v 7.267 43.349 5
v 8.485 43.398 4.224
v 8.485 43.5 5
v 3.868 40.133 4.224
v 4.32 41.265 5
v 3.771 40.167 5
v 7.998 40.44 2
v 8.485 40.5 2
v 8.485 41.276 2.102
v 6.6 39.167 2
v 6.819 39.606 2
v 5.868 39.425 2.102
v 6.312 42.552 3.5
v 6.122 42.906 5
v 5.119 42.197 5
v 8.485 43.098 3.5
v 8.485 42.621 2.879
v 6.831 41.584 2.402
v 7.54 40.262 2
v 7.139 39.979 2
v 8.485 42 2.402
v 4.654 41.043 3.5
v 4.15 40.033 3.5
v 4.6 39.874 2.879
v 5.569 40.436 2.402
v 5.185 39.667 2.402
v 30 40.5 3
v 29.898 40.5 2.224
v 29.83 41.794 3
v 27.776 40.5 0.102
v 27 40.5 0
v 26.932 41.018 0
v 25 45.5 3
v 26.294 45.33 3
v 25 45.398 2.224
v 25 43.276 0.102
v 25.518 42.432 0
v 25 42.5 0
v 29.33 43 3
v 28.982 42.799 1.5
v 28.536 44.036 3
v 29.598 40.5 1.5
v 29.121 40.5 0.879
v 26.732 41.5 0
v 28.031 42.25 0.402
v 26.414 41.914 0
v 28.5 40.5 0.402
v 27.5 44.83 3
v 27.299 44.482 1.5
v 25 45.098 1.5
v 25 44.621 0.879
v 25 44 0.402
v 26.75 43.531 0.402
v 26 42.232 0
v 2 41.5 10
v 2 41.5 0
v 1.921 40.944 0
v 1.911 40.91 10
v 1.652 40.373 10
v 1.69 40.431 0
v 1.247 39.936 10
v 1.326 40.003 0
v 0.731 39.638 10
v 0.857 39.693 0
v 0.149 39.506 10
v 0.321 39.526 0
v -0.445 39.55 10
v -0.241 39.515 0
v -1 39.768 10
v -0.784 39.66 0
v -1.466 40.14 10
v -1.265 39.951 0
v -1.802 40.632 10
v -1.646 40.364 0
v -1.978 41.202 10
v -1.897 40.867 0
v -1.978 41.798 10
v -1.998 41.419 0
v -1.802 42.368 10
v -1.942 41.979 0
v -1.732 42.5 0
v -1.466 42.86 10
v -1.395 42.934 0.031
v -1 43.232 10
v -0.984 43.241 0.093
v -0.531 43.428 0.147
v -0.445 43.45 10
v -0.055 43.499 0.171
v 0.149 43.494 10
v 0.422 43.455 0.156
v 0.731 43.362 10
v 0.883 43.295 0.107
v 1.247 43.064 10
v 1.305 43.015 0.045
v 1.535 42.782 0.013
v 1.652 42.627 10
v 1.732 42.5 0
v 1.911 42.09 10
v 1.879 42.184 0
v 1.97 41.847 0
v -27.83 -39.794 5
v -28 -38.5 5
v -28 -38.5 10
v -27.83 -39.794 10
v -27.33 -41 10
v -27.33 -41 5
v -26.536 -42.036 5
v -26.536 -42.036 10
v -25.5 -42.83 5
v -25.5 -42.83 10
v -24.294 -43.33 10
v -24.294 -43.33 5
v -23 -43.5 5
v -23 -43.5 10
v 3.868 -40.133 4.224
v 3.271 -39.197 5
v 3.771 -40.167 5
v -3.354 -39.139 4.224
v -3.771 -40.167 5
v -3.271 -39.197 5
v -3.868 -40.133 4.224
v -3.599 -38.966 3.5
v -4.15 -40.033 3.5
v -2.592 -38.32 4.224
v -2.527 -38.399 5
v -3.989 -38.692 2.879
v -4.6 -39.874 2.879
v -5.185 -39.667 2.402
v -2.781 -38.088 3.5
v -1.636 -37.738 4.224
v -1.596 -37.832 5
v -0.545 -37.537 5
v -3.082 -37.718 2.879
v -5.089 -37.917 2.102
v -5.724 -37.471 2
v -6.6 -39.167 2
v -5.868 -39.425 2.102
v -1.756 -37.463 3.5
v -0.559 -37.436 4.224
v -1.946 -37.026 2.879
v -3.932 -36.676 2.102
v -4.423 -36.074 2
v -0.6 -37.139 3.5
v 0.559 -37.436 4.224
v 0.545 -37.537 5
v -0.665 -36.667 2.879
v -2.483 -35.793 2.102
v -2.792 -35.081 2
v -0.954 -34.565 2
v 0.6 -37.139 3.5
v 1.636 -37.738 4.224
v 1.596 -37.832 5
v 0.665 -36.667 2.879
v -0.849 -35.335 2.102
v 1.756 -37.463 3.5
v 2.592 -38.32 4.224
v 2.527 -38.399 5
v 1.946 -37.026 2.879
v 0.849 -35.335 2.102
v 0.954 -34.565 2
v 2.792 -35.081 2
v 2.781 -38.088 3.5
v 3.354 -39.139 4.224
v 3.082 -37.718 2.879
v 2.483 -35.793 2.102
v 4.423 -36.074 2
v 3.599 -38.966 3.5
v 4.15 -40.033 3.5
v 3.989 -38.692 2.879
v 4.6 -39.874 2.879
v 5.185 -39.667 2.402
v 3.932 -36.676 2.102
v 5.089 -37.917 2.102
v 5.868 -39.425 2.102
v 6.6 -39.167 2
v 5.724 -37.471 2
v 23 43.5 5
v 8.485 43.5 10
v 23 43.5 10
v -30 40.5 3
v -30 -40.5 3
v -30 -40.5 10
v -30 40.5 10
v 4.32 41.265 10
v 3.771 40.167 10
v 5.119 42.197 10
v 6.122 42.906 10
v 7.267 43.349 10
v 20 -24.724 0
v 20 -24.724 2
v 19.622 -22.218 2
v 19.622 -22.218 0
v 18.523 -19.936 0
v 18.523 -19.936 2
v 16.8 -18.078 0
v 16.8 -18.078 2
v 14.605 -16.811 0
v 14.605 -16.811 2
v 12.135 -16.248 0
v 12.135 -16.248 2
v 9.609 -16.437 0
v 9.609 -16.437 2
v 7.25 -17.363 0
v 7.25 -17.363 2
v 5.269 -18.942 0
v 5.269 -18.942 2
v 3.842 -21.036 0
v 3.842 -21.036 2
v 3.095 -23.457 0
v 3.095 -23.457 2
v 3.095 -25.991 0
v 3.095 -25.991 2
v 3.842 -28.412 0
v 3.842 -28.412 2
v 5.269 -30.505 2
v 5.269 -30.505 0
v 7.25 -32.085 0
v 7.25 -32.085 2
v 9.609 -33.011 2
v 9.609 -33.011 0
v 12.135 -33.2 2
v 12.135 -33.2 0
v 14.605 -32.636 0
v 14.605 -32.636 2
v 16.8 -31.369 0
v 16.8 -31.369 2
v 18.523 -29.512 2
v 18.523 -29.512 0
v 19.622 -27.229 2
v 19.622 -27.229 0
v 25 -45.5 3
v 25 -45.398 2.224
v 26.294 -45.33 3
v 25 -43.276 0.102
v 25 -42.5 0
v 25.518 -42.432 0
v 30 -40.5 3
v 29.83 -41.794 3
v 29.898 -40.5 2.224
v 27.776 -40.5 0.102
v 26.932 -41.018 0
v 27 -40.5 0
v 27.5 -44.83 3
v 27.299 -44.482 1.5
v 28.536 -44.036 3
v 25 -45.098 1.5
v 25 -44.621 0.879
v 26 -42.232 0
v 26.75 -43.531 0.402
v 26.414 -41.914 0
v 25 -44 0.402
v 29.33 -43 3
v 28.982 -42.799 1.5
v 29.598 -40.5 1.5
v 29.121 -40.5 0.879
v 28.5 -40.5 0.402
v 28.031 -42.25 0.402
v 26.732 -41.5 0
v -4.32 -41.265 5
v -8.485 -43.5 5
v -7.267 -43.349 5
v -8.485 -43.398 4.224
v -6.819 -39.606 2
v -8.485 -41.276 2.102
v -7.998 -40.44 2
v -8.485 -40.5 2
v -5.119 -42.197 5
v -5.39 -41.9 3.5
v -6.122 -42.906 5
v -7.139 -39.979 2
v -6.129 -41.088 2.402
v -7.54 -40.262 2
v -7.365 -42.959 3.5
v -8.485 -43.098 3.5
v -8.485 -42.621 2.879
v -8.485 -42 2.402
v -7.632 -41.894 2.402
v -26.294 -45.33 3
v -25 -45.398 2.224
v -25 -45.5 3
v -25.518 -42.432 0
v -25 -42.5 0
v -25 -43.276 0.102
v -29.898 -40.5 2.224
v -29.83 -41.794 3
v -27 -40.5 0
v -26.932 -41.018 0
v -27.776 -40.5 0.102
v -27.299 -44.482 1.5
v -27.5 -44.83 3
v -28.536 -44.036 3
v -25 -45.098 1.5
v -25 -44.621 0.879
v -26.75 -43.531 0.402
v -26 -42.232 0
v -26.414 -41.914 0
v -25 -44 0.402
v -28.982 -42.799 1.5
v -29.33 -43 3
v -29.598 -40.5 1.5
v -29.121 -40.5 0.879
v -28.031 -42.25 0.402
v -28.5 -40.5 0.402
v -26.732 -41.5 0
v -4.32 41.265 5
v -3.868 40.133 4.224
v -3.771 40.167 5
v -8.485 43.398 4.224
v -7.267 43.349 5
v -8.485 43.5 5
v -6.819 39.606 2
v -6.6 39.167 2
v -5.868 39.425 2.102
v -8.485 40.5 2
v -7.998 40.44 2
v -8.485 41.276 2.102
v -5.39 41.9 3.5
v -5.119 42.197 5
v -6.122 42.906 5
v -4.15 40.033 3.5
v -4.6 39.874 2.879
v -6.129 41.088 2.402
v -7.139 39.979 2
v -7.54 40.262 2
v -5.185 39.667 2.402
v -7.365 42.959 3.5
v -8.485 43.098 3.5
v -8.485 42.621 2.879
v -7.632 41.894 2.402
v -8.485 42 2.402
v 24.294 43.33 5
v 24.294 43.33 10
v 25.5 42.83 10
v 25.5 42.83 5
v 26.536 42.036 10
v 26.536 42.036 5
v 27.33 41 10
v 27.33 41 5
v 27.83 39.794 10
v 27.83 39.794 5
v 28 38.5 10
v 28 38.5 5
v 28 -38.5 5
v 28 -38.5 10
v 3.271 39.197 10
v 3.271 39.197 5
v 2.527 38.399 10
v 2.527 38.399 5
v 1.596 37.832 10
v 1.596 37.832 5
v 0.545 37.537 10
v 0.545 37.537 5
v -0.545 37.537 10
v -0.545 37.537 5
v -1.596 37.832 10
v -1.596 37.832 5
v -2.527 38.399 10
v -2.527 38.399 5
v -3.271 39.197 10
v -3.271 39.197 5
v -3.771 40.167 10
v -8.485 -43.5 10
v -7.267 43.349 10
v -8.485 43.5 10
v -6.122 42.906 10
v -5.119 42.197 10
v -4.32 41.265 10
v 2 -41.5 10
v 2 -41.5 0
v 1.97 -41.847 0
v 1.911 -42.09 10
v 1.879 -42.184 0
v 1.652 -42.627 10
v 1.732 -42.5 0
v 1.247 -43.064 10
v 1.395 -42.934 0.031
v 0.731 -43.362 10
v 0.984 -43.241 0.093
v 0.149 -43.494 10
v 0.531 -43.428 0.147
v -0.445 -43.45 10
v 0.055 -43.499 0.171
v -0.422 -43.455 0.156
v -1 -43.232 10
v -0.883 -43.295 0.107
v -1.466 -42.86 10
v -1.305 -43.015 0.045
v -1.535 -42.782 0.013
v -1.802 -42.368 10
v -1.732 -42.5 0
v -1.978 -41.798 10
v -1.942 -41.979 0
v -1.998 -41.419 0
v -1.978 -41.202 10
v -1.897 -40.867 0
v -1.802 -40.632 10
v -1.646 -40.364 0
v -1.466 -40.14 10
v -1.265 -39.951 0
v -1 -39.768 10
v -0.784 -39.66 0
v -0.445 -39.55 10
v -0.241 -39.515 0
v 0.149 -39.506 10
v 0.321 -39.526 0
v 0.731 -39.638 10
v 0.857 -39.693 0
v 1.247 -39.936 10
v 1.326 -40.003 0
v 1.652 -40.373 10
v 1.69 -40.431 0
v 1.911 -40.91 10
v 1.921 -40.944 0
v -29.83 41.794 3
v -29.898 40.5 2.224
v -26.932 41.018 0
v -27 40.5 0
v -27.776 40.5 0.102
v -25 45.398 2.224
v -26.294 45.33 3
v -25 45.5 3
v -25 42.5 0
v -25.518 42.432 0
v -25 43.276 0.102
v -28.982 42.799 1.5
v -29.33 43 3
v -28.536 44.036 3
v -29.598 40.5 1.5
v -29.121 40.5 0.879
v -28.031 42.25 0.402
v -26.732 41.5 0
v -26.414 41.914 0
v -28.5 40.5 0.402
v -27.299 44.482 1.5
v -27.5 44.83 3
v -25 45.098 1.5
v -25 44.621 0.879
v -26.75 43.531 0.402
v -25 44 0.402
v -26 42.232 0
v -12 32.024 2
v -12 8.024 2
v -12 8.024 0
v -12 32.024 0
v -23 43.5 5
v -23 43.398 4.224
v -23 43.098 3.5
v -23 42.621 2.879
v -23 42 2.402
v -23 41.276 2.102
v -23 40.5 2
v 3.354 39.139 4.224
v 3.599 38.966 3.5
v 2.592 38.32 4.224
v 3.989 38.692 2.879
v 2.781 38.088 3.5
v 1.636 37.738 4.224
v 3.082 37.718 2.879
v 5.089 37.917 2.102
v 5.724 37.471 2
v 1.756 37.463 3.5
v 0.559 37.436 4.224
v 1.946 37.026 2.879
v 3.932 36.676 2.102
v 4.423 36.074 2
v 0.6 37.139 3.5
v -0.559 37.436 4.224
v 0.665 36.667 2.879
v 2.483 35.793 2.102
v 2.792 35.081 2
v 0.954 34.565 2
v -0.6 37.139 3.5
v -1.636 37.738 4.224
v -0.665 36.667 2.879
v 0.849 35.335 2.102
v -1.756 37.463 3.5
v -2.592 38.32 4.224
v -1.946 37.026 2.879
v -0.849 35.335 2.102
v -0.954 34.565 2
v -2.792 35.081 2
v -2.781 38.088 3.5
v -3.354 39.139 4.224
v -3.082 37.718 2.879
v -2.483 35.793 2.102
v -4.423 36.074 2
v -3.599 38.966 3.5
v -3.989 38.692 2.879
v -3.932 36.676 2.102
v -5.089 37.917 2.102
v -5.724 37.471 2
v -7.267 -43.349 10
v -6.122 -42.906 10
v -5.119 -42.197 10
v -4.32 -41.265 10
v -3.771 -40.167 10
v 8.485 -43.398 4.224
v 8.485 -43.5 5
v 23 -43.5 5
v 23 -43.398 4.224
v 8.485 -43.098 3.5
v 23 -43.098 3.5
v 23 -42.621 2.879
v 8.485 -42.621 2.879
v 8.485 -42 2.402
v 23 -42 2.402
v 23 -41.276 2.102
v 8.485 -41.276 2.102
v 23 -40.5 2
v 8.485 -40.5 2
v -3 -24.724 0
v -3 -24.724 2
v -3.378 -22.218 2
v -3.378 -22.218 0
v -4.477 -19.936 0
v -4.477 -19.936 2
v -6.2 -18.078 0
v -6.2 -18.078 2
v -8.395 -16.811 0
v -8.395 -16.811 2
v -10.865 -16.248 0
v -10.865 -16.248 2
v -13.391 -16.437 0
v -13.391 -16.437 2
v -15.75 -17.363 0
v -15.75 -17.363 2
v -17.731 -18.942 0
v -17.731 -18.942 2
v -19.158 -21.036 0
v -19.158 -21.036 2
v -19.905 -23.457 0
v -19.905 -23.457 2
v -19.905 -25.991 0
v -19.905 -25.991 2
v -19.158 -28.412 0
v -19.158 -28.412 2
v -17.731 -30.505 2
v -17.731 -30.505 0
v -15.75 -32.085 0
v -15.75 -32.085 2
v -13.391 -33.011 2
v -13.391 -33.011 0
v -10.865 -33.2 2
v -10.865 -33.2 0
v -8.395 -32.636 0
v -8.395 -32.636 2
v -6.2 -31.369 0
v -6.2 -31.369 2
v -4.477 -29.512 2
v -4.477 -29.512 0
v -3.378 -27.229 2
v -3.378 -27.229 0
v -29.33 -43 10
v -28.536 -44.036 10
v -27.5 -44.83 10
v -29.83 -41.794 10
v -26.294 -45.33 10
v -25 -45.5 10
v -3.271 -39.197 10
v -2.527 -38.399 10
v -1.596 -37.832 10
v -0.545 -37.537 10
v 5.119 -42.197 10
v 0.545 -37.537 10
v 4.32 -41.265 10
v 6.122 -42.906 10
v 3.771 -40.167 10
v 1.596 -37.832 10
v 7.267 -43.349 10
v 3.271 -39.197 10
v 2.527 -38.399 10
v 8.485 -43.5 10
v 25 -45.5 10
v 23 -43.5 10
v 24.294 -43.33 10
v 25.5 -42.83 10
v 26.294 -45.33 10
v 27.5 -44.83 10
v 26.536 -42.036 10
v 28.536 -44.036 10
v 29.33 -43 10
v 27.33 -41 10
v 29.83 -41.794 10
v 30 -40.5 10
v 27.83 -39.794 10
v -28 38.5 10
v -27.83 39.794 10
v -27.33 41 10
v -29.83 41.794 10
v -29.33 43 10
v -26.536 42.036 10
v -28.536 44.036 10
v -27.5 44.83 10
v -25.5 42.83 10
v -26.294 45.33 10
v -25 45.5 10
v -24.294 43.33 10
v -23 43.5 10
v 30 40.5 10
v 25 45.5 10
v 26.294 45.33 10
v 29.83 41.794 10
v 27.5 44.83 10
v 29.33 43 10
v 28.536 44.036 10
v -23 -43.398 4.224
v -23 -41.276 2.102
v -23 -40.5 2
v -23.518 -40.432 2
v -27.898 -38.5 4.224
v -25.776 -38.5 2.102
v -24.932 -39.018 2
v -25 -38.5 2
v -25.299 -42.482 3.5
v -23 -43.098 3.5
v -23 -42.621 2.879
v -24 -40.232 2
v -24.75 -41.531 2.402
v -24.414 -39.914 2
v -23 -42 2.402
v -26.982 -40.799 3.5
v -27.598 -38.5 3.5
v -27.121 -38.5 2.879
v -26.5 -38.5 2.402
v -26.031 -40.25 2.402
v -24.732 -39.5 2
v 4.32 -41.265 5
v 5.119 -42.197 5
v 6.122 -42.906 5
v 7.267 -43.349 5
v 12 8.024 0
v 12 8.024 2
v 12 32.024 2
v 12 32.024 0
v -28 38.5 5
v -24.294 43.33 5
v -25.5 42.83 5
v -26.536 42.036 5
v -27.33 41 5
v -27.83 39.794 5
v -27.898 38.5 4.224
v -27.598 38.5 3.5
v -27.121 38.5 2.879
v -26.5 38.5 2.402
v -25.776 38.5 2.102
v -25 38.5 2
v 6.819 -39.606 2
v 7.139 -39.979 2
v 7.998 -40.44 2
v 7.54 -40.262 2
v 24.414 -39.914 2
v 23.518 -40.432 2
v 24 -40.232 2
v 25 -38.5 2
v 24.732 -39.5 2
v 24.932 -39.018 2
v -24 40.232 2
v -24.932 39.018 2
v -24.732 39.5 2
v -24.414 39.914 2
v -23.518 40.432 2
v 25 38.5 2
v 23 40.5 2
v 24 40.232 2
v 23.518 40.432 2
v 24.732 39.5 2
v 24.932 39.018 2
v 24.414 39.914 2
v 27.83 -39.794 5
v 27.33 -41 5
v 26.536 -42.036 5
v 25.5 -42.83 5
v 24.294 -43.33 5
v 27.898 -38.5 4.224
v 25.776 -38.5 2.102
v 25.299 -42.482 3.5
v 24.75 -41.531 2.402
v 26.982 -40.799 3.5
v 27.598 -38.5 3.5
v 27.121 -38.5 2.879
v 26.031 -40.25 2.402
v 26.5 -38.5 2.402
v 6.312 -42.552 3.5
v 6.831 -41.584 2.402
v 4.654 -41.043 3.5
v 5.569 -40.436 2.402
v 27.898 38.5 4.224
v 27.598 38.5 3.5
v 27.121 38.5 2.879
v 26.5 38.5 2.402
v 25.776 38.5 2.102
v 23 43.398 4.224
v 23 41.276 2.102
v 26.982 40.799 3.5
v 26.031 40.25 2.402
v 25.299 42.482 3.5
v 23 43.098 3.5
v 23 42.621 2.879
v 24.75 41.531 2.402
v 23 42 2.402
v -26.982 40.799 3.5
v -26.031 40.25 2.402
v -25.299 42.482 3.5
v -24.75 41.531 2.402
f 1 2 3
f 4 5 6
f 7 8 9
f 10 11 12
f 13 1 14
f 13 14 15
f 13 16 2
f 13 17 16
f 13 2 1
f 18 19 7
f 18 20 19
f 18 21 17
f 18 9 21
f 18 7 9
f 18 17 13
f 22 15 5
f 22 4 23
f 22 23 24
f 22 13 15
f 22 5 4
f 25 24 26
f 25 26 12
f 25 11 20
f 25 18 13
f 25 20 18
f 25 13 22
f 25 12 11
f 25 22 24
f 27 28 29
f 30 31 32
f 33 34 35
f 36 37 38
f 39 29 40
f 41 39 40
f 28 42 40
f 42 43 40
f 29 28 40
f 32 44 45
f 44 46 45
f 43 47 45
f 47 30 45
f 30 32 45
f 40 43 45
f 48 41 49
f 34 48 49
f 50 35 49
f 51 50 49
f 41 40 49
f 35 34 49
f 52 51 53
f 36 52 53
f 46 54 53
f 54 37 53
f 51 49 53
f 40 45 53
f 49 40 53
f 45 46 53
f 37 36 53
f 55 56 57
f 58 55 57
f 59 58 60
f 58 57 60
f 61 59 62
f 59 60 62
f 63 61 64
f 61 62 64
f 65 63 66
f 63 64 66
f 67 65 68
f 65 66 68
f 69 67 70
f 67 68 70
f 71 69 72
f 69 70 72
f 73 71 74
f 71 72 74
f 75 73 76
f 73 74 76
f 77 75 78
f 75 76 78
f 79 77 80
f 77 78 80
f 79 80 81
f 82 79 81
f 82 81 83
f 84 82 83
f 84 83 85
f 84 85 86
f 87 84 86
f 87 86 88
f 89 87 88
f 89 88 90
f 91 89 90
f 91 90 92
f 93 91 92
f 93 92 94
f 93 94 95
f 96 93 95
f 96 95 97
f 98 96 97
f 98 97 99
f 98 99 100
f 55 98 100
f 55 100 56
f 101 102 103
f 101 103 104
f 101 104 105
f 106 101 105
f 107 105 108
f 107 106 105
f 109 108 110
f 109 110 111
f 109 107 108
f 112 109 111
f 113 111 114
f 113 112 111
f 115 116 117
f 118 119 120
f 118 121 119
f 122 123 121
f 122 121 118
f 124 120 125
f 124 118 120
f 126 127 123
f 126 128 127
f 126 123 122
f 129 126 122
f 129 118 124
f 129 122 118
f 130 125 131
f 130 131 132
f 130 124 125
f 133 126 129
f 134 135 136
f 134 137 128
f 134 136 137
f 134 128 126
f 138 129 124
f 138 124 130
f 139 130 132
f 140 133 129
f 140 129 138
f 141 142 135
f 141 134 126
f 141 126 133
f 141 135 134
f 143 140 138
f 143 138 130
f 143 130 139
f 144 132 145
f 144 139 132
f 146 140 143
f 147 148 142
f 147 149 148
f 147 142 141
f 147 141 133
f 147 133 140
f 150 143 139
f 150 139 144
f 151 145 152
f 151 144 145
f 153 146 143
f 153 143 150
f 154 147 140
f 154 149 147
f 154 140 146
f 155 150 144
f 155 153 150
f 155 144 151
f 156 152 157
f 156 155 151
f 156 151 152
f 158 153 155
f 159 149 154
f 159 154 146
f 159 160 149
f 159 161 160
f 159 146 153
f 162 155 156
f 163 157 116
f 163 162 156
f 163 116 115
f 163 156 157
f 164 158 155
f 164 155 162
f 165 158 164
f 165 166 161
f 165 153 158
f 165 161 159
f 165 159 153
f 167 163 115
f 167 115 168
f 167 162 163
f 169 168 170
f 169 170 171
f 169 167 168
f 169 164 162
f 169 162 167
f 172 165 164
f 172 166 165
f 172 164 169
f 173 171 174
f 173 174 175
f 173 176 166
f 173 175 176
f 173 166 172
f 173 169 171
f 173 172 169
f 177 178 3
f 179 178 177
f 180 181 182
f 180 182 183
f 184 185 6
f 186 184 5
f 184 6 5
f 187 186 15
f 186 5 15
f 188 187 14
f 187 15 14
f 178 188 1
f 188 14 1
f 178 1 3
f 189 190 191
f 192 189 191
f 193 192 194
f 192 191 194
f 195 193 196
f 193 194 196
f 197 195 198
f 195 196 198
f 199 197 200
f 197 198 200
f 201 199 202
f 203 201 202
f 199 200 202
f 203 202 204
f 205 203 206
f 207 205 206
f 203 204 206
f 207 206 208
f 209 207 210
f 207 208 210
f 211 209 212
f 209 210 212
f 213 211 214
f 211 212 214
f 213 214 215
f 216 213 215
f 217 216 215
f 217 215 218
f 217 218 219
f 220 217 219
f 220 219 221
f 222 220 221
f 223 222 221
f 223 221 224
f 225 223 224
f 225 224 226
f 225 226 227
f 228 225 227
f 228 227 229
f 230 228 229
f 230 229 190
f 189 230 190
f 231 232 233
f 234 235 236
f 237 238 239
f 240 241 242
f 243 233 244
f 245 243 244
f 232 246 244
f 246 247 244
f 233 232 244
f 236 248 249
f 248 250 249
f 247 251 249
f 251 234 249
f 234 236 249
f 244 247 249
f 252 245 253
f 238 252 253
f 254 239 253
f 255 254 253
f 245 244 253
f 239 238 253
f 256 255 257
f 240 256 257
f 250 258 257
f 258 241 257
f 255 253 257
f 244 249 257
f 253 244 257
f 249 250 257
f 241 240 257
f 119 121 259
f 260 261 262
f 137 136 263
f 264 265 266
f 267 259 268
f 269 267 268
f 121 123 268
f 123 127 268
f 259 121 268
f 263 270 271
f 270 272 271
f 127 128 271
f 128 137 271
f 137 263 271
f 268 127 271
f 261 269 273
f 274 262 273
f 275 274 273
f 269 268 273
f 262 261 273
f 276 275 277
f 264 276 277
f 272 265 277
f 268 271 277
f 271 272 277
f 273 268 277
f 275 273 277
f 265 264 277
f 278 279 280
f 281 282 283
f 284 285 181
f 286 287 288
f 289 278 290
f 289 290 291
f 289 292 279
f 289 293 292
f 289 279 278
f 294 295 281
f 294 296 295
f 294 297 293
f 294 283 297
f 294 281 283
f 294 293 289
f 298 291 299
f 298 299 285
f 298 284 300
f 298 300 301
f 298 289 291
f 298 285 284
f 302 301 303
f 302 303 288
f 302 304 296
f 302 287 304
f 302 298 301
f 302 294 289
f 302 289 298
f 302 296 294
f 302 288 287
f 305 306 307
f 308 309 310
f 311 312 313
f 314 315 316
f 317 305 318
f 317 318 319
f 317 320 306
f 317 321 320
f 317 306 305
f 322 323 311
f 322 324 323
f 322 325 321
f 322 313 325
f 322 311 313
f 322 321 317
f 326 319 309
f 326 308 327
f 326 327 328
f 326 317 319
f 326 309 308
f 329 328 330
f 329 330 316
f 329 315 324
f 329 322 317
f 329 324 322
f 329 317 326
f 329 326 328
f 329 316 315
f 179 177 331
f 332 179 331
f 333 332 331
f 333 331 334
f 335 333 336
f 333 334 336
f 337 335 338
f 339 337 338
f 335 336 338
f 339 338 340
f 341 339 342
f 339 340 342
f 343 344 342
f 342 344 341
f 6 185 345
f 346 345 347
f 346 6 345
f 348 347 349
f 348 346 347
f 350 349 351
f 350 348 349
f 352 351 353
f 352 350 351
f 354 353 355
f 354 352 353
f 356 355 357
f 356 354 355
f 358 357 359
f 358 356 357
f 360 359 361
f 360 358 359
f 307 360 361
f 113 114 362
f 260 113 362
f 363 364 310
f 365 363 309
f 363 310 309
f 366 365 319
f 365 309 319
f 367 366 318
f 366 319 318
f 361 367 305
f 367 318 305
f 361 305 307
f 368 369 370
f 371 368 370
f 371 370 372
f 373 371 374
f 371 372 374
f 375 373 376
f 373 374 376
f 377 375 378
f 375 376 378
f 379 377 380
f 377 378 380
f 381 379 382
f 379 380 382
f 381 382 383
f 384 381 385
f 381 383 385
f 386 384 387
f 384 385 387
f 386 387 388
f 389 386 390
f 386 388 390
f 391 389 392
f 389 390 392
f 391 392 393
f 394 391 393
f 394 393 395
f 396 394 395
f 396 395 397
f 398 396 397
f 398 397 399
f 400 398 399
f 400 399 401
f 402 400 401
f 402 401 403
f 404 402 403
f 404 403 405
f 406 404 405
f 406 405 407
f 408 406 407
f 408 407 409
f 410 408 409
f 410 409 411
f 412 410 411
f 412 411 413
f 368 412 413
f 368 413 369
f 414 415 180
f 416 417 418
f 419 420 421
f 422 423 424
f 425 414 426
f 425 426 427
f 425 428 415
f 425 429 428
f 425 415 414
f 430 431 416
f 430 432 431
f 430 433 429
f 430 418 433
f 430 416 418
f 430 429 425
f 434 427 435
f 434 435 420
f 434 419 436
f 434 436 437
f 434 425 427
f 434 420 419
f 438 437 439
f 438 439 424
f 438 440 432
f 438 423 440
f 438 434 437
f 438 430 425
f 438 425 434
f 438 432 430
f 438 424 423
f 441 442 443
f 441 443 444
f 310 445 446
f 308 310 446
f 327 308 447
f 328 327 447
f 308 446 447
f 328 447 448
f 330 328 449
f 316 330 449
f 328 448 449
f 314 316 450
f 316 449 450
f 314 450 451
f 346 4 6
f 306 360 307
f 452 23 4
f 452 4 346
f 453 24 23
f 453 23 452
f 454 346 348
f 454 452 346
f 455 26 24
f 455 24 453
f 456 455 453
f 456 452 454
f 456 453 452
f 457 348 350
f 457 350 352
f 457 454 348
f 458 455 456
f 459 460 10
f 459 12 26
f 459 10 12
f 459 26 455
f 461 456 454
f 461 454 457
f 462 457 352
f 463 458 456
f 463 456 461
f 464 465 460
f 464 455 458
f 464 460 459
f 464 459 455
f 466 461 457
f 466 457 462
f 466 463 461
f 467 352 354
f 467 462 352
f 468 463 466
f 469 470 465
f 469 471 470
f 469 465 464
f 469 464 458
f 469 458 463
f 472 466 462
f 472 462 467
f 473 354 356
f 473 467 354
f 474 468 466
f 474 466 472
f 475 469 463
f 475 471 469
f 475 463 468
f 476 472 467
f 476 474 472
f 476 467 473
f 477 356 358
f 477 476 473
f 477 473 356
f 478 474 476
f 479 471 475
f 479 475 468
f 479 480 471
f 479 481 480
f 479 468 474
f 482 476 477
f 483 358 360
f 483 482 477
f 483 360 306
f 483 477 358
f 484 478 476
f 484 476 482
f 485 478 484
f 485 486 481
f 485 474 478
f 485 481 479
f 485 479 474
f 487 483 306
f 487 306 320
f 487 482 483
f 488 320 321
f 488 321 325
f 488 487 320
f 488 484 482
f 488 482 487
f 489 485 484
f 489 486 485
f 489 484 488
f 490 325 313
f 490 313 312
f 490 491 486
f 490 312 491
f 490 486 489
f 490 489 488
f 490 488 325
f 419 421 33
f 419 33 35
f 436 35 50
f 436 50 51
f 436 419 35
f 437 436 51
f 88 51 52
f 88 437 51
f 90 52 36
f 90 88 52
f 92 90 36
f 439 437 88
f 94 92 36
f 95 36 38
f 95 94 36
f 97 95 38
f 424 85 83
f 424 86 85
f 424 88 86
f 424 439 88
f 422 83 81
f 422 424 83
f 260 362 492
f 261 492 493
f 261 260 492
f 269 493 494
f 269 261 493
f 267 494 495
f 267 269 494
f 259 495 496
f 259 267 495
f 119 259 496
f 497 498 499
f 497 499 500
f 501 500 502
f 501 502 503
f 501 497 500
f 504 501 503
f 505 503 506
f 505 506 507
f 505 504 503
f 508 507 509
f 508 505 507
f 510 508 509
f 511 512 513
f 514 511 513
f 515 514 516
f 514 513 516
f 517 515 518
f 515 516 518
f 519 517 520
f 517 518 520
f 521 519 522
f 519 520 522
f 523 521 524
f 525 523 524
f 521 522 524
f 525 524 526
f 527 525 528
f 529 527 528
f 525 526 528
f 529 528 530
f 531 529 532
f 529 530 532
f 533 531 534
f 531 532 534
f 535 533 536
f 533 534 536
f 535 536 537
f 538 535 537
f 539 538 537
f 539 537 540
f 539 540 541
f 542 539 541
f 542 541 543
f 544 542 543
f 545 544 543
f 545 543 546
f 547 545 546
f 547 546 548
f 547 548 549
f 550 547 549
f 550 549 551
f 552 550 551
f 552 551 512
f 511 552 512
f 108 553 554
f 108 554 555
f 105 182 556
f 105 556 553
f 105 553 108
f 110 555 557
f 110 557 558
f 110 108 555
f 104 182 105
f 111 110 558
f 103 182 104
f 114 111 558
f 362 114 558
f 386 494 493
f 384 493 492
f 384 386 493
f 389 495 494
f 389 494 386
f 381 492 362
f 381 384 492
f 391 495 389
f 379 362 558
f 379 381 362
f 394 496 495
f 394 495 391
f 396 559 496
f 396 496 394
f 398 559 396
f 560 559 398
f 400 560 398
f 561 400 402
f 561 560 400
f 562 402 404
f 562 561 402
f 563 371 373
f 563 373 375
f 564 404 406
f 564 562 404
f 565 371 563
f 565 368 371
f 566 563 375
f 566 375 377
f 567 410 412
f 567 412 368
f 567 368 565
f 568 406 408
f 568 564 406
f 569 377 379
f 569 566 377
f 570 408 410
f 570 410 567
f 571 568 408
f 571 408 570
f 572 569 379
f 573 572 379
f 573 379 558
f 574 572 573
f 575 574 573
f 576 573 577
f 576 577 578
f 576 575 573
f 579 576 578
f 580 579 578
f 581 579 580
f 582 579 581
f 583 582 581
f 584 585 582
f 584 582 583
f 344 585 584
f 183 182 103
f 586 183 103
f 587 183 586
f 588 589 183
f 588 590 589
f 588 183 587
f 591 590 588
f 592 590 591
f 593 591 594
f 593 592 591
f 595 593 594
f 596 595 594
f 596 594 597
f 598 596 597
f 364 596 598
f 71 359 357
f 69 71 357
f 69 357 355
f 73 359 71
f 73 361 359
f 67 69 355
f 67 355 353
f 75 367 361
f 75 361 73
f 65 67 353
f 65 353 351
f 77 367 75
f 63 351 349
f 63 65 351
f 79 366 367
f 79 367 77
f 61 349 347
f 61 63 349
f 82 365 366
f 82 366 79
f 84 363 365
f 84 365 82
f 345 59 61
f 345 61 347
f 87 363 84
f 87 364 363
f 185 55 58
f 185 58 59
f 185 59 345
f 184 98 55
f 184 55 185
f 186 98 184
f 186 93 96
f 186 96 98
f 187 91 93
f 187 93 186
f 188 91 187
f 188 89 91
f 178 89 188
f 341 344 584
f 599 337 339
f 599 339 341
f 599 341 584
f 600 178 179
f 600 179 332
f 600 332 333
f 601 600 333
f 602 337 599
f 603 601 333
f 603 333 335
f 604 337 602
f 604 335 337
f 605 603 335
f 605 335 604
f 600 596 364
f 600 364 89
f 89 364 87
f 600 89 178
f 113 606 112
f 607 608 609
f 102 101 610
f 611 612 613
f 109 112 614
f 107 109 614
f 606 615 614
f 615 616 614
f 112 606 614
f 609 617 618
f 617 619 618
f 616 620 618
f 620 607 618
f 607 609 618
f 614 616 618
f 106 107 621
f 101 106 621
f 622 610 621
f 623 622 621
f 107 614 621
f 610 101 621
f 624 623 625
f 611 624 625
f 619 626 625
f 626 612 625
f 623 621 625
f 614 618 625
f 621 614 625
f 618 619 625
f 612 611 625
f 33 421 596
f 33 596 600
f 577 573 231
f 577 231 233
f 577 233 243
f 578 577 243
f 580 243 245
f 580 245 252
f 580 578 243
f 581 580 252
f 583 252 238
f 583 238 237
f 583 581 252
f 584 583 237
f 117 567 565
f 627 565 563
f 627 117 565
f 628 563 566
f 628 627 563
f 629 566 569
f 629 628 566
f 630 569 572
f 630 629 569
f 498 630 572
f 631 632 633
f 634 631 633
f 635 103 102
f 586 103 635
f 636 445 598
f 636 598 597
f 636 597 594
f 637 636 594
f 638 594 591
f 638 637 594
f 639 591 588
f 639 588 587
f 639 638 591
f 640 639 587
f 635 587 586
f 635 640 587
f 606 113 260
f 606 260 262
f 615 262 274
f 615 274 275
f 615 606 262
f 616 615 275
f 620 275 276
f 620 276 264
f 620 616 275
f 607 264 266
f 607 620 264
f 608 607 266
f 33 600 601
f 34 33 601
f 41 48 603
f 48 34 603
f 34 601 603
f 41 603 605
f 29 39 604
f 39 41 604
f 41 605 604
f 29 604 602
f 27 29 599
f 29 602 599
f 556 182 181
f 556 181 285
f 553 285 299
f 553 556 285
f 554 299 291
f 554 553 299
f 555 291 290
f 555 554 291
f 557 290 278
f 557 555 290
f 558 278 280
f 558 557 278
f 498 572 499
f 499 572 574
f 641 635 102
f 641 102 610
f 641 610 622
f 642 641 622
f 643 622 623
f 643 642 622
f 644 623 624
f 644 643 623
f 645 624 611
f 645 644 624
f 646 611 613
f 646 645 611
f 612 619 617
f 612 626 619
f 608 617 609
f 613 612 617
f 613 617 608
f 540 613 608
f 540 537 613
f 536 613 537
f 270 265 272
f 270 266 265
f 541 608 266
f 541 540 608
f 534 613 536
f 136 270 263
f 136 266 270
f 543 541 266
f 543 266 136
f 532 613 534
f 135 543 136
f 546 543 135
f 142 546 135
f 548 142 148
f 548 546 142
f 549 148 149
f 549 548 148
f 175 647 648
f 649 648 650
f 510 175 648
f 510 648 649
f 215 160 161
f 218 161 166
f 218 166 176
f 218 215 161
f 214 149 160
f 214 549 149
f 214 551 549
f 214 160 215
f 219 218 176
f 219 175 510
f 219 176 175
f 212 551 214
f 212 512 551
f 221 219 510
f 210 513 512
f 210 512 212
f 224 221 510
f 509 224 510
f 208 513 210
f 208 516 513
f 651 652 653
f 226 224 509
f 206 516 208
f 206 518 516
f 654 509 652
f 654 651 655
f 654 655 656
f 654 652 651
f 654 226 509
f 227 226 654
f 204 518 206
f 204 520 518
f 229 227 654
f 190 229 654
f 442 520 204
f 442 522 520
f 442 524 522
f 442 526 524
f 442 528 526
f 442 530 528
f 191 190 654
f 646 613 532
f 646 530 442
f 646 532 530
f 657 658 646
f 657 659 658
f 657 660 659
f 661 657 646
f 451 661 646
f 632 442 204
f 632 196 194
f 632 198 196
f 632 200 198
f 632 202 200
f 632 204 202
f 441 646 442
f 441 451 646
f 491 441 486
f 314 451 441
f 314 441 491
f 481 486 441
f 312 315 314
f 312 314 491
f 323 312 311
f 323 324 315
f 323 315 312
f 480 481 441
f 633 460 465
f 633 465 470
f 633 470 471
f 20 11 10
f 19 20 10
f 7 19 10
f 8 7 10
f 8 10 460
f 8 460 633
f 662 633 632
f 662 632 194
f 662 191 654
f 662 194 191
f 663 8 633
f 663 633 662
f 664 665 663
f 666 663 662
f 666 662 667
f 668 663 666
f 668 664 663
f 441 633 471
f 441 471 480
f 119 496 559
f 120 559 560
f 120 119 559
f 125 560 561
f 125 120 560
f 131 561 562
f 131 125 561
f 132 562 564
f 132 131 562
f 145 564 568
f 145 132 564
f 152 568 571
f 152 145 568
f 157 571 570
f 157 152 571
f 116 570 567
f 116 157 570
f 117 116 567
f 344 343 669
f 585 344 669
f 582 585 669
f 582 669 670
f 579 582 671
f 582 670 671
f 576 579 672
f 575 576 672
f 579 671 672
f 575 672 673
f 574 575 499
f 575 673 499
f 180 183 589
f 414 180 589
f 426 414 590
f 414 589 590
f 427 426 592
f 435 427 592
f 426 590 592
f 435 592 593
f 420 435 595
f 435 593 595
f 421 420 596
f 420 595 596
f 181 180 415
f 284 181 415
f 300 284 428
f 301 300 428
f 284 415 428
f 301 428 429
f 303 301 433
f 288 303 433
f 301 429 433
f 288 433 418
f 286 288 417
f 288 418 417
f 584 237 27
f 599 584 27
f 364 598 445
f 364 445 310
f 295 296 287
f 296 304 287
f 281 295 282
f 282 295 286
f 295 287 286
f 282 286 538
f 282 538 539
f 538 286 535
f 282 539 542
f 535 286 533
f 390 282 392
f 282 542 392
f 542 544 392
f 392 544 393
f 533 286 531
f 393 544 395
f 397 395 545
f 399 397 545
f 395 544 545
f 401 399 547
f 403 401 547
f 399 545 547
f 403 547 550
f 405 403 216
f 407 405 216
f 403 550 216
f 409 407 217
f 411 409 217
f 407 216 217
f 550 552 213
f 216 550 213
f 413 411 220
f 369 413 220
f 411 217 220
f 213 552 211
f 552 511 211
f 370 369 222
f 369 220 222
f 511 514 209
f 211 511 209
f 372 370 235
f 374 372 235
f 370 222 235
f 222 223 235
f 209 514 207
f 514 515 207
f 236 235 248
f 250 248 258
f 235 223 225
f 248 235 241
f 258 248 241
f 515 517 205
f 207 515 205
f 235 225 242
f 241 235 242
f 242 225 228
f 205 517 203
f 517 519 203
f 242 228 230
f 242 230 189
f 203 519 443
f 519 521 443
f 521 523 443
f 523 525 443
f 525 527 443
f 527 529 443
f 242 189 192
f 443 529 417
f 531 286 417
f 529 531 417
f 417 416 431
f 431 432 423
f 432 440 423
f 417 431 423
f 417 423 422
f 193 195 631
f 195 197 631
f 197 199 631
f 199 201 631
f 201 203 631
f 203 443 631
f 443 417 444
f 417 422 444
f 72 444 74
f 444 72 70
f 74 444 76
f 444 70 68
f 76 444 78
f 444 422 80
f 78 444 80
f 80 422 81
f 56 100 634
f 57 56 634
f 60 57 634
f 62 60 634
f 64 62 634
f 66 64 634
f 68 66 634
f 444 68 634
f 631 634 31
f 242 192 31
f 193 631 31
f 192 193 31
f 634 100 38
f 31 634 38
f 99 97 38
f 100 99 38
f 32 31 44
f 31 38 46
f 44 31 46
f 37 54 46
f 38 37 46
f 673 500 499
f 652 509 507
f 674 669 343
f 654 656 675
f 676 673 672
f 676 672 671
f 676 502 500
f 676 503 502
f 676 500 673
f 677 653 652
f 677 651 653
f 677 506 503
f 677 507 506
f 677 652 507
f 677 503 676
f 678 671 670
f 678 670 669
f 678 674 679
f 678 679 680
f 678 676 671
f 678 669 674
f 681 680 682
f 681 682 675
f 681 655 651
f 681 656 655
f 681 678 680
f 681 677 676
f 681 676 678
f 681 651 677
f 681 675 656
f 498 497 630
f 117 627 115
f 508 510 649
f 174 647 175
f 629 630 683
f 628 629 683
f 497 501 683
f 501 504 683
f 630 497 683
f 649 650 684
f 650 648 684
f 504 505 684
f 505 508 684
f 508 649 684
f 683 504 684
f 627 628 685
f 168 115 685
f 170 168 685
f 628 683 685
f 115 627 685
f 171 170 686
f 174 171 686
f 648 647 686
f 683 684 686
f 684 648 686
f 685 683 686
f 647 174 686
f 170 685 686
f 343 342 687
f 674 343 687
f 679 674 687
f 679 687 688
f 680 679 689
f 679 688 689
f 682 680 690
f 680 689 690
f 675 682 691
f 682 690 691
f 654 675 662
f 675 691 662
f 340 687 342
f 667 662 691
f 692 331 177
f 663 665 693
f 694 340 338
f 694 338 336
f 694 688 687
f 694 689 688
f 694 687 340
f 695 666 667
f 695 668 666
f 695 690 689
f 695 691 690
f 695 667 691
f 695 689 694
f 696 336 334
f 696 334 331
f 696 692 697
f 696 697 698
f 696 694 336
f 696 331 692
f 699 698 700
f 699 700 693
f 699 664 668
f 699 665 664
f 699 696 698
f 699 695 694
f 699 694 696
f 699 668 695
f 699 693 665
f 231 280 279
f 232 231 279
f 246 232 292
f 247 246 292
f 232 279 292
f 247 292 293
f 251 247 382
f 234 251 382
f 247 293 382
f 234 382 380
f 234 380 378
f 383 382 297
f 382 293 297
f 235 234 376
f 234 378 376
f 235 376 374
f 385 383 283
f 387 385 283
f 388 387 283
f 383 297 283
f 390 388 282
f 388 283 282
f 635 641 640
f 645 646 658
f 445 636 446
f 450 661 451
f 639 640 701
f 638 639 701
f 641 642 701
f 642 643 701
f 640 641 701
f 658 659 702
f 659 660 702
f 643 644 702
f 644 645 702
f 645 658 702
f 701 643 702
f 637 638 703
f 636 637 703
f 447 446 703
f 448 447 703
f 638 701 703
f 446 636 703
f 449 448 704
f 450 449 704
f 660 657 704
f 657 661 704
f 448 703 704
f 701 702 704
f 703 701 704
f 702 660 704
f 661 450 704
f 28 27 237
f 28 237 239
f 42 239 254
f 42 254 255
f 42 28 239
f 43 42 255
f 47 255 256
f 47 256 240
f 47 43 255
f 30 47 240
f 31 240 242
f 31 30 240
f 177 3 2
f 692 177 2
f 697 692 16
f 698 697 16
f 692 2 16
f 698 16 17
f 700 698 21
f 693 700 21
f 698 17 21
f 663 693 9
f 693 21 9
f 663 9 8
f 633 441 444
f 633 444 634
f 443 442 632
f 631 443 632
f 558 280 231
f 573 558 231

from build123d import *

# Parameters (mm, degrees)
F3_W          = 60
F3_H          = 91
F4_DEPTH      = 10
F5_W          = 56
F5_H          = 87
F5_W_2        = 24
F5_H_2        = 24
F6_DEPTH      = 8
F7_R          = 4
F8_DEPTH      = 10
F9_R          = 2
F10_DEPTH     = 10.001
F11_R         = 5
F12_R         = 5
F13_T1_DEPTH  = 77
F13_T3_DEPTH  = 14.5147186258
F13_T5_DEPTH  = 14.5147186258
F13_T8_ANGLE  = 90
F13_T10_ANGLE = 70.5287793655
F13_T12_ANGLE = 141.057558731
F13_T14_ANGLE = 90
F13_T16_ANGLE = 70.5287793655
F13_T18_ANGLE = 70.5287793655
F13_T20_ANGLE = 90
F13_T22_ANGLE = 141.057558731
F13_T24_ANGLE = 70.5287793655
F13_T26_ANGLE = 90
F13_T27_DEPTH = 81
F13_T29_DEPTH = 50
F13_T32_ANGLE = 90
F13_T34_ANGLE = 90
F13_T36_ANGLE = 90
F13_T38_ANGLE = 90
F14_R         = 8.5
F15_DEPTH     = 2.0010001
F16_DEPTH     = 10.0010001


# Not quite as in the source:
# - a fillet or chamfer that OpenCascade refuses, or shapes differently, is made with other operations: its cross-section is extruded or revolved along the edge and cut away or added


with BuildPart() as f4:
    # F3 (on Top) → F4 (new body)
    with BuildSketch(Plane.XY):
        Rectangle(F3_W, F3_H)
    extrude(amount=F4_DEPTH)

    # F5 (on face) → F6 (cut)
    with BuildSketch(Plane.XY.offset(10)):
        Rectangle(F5_W, F5_H)
        with Locations((0, 20.0242325664)):
            Rectangle(F5_W_2, F5_H_2, mode=Mode.SUBTRACT)
    extrude(amount=-F6_DEPTH, mode=Mode.SUBTRACT)

    # F7 (on face) → F8 (join)
    with BuildSketch(Plane(origin=(0, 0, 0), x_dir=(1, 0, 0), z_dir=(0, 0, -1))):
        with Locations((0, -41.5)):
            Circle(F7_R)
        with Locations((0, 41.5)):
            Circle(F7_R)
    extrude(amount=-F8_DEPTH)

    # F9 (on face) → F10 (cut, through all)
    with BuildSketch(Plane(origin=(0, 0, 0), x_dir=(1, 0, 0), z_dir=(0, 0, -1))):
        with Locations((0, -41.5)):
            Circle(F9_R)
        with Locations((0, 41.5)):
            Circle(F9_R)
    extrude(amount=-F10_DEPTH, mode=Mode.SUBTRACT)

    # F11
    f11_edges = [f4.edges().sort_by_distance(p)[0] for p in [
        (3.464102, 43.5, 6),
        (-3.464102, 43.5, 6),
        (-3.464102, -43.5, 6),
        (3.464102, -43.5, 6),
    ]]
    fillet(f11_edges, radius=F11_R)

    # F12
    f12_edges = [f4.edges().sort_by_distance(p)[0] for p in [
        (30, -45.5, 5),
        (-30, -45.5, 5),
        (30, 45.5, 5),
        (-30, 45.5, 5),
        (28, -43.5, 6),
        (-28, -43.5, 6),
        (-28, 43.5, 6),
        (28, 43.5, 6),
    ]]
    fillet(f12_edges, radius=F12_R)

    # F13: fillet of radius 3 on 24 edges, made by hand

    # F13_s2 → F13_t1 (join)
    with BuildSketch(Plane.XZ.offset(-38.5)):
        with BuildLine():
            ThreePointArc((-28, 5), (-27.1213203436, 2.8786796564), (-25, 2))
            Line((-25, 2), (-28, 2))
            Line((-28, 2), (-28, 5))
        make_face()
        with BuildLine():
            ThreePointArc((28, 5), (27.1213203436, 2.8786796564), (25, 2))
            Line((25, 2), (28, 2))
            Line((28, 2), (28, 5))
        make_face()
    extrude(amount=F13_T1_DEPTH)

    # F13_s4 → F13_t3 (join)
    with BuildSketch(Plane.YZ.offset(8.4852813742)):
        with BuildLine():
            ThreePointArc((-43.5, 5), (-42.6213203436, 2.8786796564), (-40.5, 2))
            Line((-40.5, 2), (-43.5, 2))
            Line((-43.5, 2), (-43.5, 5))
        make_face()
        with BuildLine():
            ThreePointArc((43.5, 5), (42.6213203436, 2.8786796564), (40.5, 2))
            Line((40.5, 2), (43.5, 2))
            Line((43.5, 2), (43.5, 5))
        make_face()
    extrude(amount=F13_T3_DEPTH)

    # F13_s6 → F13_t5 (join)
    with BuildSketch(Plane.YZ.offset(-23)):
        with BuildLine():
            ThreePointArc((-43.5, 5), (-42.6213203436, 2.8786796564), (-40.5, 2))
            Line((-40.5, 2), (-43.5, 2))
            Line((-43.5, 2), (-43.5, 5))
        make_face()
        with BuildLine():
            ThreePointArc((43.5, 5), (42.6213203436, 2.8786796564), (40.5, 2))
            Line((40.5, 2), (43.5, 2))
            Line((43.5, 2), (43.5, 5))
        make_face()
    extrude(amount=F13_T5_DEPTH)

    # F13_s7 → F13_t8 (revolve)
    with BuildSketch(Plane.YZ.offset(23)):
        with BuildLine():
            ThreePointArc((-43.5, 5), (-42.6213203436, 2.8786796564), (-40.5, 2))
            Line((-40.5, 2), (-43.5, 2))
            Line((-43.5, 2), (-43.5, 5))
        make_face()
    revolve(axis=Axis((23, -38.5, 2), (0, 0, 1)), revolution_arc=F13_T8_ANGLE)

    # F13_s9 → F13_t10 (revolve)
    with BuildSketch(Plane.YZ.offset(8.4852813742)):
        with BuildLine():
            ThreePointArc((-43.5, 5), (-42.6213203436, 2.8786796564), (-40.5, 2))
            Line((-40.5, 2), (-43.5, 2))
            Line((-43.5, 2), (-43.5, 5))
        make_face()
    revolve(axis=Axis((8.4852813742, -38.5, 2), (0, 0, -1)), revolution_arc=F13_T10_ANGLE)

    # F13_s11 → F13_t12 (revolve)
    with BuildSketch(Plane(origin=(-13.0421917419, -36.8888888889, 0), x_dir=(0, 0, 1), z_dir=(-0.3333333333, -0.9428090416, 0))):
        with BuildLine():
            ThreePointArc((5, -9.8333333333), (2.8786796564, -8.9546536769), (2, -6.8333333333))
            Line((2, -6.8333333333), (2, -9.8333333333))
            Line((2, -9.8333333333), (5, -9.8333333333))
        make_face()
    revolve(axis=Axis((0, -41.5, 2), (0, 0, -1)), revolution_arc=F13_T12_ANGLE)

    # F13_s13 → F13_t14 (revolve)
    with BuildSketch(Plane.XZ.offset(-38.5)):
        with BuildLine():
            ThreePointArc((28, 5), (27.1213203436, 2.8786796564), (25, 2))
            Line((25, 2), (28, 2))
            Line((28, 2), (28, 5))
        make_face()
    revolve(axis=Axis((23, 38.5, 2), (0, 0, 1)), revolution_arc=F13_T14_ANGLE)

    # F13_s15 → F13_t16 (revolve)
    with BuildSketch(Plane(origin=(-13.0421917419, -36.8888888889, 0), x_dir=(0, 0, 1), z_dir=(0.3333333333, 0.9428090416, 0))):
        with BuildLine():
            ThreePointArc((5, 9.8333333333), (2.8786796564, 8.9546536769), (2, 6.8333333333))
            Line((2, 6.8333333333), (2, 9.8333333333))
            Line((2, 9.8333333333), (5, 9.8333333333))
        make_face()
    revolve(axis=Axis((-8.4852813742, -38.5, 2), (0, 0, -1)), revolution_arc=F13_T16_ANGLE)

    # F13_s17 → F13_t18 (revolve)
    with BuildSketch(Plane.YZ.offset(8.4852813742)):
        with BuildLine():
            ThreePointArc((43.5, 5), (42.6213203436, 2.8786796564), (40.5, 2))
            Line((40.5, 2), (43.5, 2))
            Line((43.5, 2), (43.5, 5))
        make_face()
    revolve(axis=Axis((8.4852813742, 38.5, 2), (0, 0, 1)), revolution_arc=F13_T18_ANGLE)

    # F13_s19 → F13_t20 (revolve)
    with BuildSketch(Plane.YZ.offset(-23)):
        with BuildLine():
            ThreePointArc((-43.5, 5), (-42.6213203436, 2.8786796564), (-40.5, 2))
            Line((-40.5, 2), (-43.5, 2))
            Line((-43.5, 2), (-43.5, 5))
        make_face()
    revolve(axis=Axis((-23, -38.5, 2), (0, 0, -1)), revolution_arc=F13_T20_ANGLE)

    # F13_s21 → F13_t22 (revolve)
    with BuildSketch(Plane(origin=(13.0421917419, 36.8888888889, 0), x_dir=(0, 0, 1), z_dir=(0.3333333333, 0.9428090416, 0))):
        with BuildLine():
            ThreePointArc((5, -9.8333333333), (2.8786796564, -8.9546536769), (2, -6.8333333333))
            Line((2, -6.8333333333), (2, -9.8333333333))
            Line((2, -9.8333333333), (5, -9.8333333333))
        make_face()
    revolve(axis=Axis((0, 41.5, 2), (0, 0, -1)), revolution_arc=F13_T22_ANGLE)

    # F13_s23 → F13_t24 (revolve)
    with BuildSketch(Plane(origin=(-13.0421917419, 36.8888888889, 0), x_dir=(0, 0, 1), z_dir=(0.3333333333, -0.9428090416, 0))):
        with BuildLine():
            ThreePointArc((5, -9.8333333333), (2.8786796564, -8.9546536769), (2, -6.8333333333))
            Line((2, -6.8333333333), (2, -9.8333333333))
            Line((2, -9.8333333333), (5, -9.8333333333))
        make_face()
    revolve(axis=Axis((-8.4852813742, 38.5, 2), (0, 0, 1)), revolution_arc=F13_T24_ANGLE)

    # F13_s25 → F13_t26 (revolve)
    with BuildSketch(Plane.XZ.offset(-38.5)):
        with BuildLine():
            ThreePointArc((-28, 5), (-27.1213203436, 2.8786796564), (-25, 2))
            Line((-25, 2), (-28, 2))
            Line((-28, 2), (-28, 5))
        make_face()
    revolve(axis=Axis((-23, 38.5, 2), (0, 0, -1)), revolution_arc=F13_T26_ANGLE)

    # F13_s28 → F13_t27 (cut)
    with BuildSketch(Plane.XZ.offset(-40.5)):
        with BuildLine():
            ThreePointArc((30, 3), (29.1213203436, 0.8786796564), (27, 0))
            Line((27, 0), (30, 0))
            Line((30, 0), (30, 3))
        make_face()
        with BuildLine():
            ThreePointArc((-30, 3), (-29.1213203436, 0.8786796564), (-27, 0))
            Line((-27, 0), (-30, 0))
            Line((-30, 0), (-30, 3))
        make_face()
    extrude(amount=F13_T27_DEPTH, mode=Mode.SUBTRACT)

    # F13_s30 → F13_t29 (cut)
    with BuildSketch(Plane.YZ.offset(-25)):
        with BuildLine():
            ThreePointArc((-45.5, 3), (-44.6213203436, 0.8786796564), (-42.5, 0))
            Line((-42.5, 0), (-45.5, 0))
            Line((-45.5, 0), (-45.5, 3))
        make_face()
        with BuildLine():
            ThreePointArc((45.5, 3), (44.6213203436, 0.8786796564), (42.5, 0))
            Line((42.5, 0), (45.5, 0))
            Line((45.5, 0), (45.5, 3))
        make_face()
    extrude(amount=F13_T29_DEPTH, mode=Mode.SUBTRACT)

    # F13_s31 → F13_t32 (revolve, cut)
    with BuildSketch(Plane.YZ.offset(25)):
        with BuildLine():
            ThreePointArc((-45.5, 3), (-44.6213203436, 0.8786796564), (-42.5, 0))
            Line((-42.5, 0), (-45.5, 0))
            Line((-45.5, 0), (-45.5, 3))
        make_face()
    revolve(axis=Axis((25, -40.5, 0), (0, 0, 1)), revolution_arc=F13_T32_ANGLE, mode=Mode.SUBTRACT)

    # F13_s33 → F13_t34 (revolve, cut)
    with BuildSketch(Plane.YZ.offset(-25)):
        with BuildLine():
            ThreePointArc((-45.5, 3), (-44.6213203436, 0.8786796564), (-42.5, 0))
            Line((-42.5, 0), (-45.5, 0))
            Line((-45.5, 0), (-45.5, 3))
        make_face()
    revolve(axis=Axis((-25, -40.5, 0), (0, 0, -1)), revolution_arc=F13_T34_ANGLE, mode=Mode.SUBTRACT)

    # F13_s35 → F13_t36 (revolve, cut)
    with BuildSketch(Plane.XZ.offset(-40.5)):
        with BuildLine():
            ThreePointArc((30, 3), (29.1213203436, 0.8786796564), (27, 0))
            Line((27, 0), (30, 0))
            Line((30, 0), (30, 3))
        make_face()
    revolve(axis=Axis((25, 40.5, 0), (0, 0, 1)), revolution_arc=F13_T36_ANGLE, mode=Mode.SUBTRACT)

    # F13_s37 → F13_t38 (revolve, cut)
    with BuildSketch(Plane.XZ.offset(-40.5)):
        with BuildLine():
            ThreePointArc((-30, 3), (-29.1213203436, 0.8786796564), (-27, 0))
            Line((-27, 0), (-30, 0))
            Line((-30, 0), (-30, 3))
        make_face()
    revolve(axis=Axis((-25, 40.5, 0), (0, 0, -1)), revolution_arc=F13_T38_ANGLE, mode=Mode.SUBTRACT)

    # F14 (on face) → F15 (cut, through all)
    with BuildSketch(Plane.XY.offset(2)):
        with Locations((11.5, -24.7238390148)):
            Circle(F14_R)
        with Locations((-11.5, -24.7238390148)):
            Circle(F14_R)
    extrude(amount=-F15_DEPTH, mode=Mode.SUBTRACT)

    # F16 (cut, through all): a face of the model
    f16_faces = [f4.faces().sort_by_distance(p)[0] for p in [
        (0, 20.0242325664, 10),
    ]]
    extrude(f16_faces, amount=-F16_DEPTH, mode=Mode.SUBTRACT)


solid = f4.part
